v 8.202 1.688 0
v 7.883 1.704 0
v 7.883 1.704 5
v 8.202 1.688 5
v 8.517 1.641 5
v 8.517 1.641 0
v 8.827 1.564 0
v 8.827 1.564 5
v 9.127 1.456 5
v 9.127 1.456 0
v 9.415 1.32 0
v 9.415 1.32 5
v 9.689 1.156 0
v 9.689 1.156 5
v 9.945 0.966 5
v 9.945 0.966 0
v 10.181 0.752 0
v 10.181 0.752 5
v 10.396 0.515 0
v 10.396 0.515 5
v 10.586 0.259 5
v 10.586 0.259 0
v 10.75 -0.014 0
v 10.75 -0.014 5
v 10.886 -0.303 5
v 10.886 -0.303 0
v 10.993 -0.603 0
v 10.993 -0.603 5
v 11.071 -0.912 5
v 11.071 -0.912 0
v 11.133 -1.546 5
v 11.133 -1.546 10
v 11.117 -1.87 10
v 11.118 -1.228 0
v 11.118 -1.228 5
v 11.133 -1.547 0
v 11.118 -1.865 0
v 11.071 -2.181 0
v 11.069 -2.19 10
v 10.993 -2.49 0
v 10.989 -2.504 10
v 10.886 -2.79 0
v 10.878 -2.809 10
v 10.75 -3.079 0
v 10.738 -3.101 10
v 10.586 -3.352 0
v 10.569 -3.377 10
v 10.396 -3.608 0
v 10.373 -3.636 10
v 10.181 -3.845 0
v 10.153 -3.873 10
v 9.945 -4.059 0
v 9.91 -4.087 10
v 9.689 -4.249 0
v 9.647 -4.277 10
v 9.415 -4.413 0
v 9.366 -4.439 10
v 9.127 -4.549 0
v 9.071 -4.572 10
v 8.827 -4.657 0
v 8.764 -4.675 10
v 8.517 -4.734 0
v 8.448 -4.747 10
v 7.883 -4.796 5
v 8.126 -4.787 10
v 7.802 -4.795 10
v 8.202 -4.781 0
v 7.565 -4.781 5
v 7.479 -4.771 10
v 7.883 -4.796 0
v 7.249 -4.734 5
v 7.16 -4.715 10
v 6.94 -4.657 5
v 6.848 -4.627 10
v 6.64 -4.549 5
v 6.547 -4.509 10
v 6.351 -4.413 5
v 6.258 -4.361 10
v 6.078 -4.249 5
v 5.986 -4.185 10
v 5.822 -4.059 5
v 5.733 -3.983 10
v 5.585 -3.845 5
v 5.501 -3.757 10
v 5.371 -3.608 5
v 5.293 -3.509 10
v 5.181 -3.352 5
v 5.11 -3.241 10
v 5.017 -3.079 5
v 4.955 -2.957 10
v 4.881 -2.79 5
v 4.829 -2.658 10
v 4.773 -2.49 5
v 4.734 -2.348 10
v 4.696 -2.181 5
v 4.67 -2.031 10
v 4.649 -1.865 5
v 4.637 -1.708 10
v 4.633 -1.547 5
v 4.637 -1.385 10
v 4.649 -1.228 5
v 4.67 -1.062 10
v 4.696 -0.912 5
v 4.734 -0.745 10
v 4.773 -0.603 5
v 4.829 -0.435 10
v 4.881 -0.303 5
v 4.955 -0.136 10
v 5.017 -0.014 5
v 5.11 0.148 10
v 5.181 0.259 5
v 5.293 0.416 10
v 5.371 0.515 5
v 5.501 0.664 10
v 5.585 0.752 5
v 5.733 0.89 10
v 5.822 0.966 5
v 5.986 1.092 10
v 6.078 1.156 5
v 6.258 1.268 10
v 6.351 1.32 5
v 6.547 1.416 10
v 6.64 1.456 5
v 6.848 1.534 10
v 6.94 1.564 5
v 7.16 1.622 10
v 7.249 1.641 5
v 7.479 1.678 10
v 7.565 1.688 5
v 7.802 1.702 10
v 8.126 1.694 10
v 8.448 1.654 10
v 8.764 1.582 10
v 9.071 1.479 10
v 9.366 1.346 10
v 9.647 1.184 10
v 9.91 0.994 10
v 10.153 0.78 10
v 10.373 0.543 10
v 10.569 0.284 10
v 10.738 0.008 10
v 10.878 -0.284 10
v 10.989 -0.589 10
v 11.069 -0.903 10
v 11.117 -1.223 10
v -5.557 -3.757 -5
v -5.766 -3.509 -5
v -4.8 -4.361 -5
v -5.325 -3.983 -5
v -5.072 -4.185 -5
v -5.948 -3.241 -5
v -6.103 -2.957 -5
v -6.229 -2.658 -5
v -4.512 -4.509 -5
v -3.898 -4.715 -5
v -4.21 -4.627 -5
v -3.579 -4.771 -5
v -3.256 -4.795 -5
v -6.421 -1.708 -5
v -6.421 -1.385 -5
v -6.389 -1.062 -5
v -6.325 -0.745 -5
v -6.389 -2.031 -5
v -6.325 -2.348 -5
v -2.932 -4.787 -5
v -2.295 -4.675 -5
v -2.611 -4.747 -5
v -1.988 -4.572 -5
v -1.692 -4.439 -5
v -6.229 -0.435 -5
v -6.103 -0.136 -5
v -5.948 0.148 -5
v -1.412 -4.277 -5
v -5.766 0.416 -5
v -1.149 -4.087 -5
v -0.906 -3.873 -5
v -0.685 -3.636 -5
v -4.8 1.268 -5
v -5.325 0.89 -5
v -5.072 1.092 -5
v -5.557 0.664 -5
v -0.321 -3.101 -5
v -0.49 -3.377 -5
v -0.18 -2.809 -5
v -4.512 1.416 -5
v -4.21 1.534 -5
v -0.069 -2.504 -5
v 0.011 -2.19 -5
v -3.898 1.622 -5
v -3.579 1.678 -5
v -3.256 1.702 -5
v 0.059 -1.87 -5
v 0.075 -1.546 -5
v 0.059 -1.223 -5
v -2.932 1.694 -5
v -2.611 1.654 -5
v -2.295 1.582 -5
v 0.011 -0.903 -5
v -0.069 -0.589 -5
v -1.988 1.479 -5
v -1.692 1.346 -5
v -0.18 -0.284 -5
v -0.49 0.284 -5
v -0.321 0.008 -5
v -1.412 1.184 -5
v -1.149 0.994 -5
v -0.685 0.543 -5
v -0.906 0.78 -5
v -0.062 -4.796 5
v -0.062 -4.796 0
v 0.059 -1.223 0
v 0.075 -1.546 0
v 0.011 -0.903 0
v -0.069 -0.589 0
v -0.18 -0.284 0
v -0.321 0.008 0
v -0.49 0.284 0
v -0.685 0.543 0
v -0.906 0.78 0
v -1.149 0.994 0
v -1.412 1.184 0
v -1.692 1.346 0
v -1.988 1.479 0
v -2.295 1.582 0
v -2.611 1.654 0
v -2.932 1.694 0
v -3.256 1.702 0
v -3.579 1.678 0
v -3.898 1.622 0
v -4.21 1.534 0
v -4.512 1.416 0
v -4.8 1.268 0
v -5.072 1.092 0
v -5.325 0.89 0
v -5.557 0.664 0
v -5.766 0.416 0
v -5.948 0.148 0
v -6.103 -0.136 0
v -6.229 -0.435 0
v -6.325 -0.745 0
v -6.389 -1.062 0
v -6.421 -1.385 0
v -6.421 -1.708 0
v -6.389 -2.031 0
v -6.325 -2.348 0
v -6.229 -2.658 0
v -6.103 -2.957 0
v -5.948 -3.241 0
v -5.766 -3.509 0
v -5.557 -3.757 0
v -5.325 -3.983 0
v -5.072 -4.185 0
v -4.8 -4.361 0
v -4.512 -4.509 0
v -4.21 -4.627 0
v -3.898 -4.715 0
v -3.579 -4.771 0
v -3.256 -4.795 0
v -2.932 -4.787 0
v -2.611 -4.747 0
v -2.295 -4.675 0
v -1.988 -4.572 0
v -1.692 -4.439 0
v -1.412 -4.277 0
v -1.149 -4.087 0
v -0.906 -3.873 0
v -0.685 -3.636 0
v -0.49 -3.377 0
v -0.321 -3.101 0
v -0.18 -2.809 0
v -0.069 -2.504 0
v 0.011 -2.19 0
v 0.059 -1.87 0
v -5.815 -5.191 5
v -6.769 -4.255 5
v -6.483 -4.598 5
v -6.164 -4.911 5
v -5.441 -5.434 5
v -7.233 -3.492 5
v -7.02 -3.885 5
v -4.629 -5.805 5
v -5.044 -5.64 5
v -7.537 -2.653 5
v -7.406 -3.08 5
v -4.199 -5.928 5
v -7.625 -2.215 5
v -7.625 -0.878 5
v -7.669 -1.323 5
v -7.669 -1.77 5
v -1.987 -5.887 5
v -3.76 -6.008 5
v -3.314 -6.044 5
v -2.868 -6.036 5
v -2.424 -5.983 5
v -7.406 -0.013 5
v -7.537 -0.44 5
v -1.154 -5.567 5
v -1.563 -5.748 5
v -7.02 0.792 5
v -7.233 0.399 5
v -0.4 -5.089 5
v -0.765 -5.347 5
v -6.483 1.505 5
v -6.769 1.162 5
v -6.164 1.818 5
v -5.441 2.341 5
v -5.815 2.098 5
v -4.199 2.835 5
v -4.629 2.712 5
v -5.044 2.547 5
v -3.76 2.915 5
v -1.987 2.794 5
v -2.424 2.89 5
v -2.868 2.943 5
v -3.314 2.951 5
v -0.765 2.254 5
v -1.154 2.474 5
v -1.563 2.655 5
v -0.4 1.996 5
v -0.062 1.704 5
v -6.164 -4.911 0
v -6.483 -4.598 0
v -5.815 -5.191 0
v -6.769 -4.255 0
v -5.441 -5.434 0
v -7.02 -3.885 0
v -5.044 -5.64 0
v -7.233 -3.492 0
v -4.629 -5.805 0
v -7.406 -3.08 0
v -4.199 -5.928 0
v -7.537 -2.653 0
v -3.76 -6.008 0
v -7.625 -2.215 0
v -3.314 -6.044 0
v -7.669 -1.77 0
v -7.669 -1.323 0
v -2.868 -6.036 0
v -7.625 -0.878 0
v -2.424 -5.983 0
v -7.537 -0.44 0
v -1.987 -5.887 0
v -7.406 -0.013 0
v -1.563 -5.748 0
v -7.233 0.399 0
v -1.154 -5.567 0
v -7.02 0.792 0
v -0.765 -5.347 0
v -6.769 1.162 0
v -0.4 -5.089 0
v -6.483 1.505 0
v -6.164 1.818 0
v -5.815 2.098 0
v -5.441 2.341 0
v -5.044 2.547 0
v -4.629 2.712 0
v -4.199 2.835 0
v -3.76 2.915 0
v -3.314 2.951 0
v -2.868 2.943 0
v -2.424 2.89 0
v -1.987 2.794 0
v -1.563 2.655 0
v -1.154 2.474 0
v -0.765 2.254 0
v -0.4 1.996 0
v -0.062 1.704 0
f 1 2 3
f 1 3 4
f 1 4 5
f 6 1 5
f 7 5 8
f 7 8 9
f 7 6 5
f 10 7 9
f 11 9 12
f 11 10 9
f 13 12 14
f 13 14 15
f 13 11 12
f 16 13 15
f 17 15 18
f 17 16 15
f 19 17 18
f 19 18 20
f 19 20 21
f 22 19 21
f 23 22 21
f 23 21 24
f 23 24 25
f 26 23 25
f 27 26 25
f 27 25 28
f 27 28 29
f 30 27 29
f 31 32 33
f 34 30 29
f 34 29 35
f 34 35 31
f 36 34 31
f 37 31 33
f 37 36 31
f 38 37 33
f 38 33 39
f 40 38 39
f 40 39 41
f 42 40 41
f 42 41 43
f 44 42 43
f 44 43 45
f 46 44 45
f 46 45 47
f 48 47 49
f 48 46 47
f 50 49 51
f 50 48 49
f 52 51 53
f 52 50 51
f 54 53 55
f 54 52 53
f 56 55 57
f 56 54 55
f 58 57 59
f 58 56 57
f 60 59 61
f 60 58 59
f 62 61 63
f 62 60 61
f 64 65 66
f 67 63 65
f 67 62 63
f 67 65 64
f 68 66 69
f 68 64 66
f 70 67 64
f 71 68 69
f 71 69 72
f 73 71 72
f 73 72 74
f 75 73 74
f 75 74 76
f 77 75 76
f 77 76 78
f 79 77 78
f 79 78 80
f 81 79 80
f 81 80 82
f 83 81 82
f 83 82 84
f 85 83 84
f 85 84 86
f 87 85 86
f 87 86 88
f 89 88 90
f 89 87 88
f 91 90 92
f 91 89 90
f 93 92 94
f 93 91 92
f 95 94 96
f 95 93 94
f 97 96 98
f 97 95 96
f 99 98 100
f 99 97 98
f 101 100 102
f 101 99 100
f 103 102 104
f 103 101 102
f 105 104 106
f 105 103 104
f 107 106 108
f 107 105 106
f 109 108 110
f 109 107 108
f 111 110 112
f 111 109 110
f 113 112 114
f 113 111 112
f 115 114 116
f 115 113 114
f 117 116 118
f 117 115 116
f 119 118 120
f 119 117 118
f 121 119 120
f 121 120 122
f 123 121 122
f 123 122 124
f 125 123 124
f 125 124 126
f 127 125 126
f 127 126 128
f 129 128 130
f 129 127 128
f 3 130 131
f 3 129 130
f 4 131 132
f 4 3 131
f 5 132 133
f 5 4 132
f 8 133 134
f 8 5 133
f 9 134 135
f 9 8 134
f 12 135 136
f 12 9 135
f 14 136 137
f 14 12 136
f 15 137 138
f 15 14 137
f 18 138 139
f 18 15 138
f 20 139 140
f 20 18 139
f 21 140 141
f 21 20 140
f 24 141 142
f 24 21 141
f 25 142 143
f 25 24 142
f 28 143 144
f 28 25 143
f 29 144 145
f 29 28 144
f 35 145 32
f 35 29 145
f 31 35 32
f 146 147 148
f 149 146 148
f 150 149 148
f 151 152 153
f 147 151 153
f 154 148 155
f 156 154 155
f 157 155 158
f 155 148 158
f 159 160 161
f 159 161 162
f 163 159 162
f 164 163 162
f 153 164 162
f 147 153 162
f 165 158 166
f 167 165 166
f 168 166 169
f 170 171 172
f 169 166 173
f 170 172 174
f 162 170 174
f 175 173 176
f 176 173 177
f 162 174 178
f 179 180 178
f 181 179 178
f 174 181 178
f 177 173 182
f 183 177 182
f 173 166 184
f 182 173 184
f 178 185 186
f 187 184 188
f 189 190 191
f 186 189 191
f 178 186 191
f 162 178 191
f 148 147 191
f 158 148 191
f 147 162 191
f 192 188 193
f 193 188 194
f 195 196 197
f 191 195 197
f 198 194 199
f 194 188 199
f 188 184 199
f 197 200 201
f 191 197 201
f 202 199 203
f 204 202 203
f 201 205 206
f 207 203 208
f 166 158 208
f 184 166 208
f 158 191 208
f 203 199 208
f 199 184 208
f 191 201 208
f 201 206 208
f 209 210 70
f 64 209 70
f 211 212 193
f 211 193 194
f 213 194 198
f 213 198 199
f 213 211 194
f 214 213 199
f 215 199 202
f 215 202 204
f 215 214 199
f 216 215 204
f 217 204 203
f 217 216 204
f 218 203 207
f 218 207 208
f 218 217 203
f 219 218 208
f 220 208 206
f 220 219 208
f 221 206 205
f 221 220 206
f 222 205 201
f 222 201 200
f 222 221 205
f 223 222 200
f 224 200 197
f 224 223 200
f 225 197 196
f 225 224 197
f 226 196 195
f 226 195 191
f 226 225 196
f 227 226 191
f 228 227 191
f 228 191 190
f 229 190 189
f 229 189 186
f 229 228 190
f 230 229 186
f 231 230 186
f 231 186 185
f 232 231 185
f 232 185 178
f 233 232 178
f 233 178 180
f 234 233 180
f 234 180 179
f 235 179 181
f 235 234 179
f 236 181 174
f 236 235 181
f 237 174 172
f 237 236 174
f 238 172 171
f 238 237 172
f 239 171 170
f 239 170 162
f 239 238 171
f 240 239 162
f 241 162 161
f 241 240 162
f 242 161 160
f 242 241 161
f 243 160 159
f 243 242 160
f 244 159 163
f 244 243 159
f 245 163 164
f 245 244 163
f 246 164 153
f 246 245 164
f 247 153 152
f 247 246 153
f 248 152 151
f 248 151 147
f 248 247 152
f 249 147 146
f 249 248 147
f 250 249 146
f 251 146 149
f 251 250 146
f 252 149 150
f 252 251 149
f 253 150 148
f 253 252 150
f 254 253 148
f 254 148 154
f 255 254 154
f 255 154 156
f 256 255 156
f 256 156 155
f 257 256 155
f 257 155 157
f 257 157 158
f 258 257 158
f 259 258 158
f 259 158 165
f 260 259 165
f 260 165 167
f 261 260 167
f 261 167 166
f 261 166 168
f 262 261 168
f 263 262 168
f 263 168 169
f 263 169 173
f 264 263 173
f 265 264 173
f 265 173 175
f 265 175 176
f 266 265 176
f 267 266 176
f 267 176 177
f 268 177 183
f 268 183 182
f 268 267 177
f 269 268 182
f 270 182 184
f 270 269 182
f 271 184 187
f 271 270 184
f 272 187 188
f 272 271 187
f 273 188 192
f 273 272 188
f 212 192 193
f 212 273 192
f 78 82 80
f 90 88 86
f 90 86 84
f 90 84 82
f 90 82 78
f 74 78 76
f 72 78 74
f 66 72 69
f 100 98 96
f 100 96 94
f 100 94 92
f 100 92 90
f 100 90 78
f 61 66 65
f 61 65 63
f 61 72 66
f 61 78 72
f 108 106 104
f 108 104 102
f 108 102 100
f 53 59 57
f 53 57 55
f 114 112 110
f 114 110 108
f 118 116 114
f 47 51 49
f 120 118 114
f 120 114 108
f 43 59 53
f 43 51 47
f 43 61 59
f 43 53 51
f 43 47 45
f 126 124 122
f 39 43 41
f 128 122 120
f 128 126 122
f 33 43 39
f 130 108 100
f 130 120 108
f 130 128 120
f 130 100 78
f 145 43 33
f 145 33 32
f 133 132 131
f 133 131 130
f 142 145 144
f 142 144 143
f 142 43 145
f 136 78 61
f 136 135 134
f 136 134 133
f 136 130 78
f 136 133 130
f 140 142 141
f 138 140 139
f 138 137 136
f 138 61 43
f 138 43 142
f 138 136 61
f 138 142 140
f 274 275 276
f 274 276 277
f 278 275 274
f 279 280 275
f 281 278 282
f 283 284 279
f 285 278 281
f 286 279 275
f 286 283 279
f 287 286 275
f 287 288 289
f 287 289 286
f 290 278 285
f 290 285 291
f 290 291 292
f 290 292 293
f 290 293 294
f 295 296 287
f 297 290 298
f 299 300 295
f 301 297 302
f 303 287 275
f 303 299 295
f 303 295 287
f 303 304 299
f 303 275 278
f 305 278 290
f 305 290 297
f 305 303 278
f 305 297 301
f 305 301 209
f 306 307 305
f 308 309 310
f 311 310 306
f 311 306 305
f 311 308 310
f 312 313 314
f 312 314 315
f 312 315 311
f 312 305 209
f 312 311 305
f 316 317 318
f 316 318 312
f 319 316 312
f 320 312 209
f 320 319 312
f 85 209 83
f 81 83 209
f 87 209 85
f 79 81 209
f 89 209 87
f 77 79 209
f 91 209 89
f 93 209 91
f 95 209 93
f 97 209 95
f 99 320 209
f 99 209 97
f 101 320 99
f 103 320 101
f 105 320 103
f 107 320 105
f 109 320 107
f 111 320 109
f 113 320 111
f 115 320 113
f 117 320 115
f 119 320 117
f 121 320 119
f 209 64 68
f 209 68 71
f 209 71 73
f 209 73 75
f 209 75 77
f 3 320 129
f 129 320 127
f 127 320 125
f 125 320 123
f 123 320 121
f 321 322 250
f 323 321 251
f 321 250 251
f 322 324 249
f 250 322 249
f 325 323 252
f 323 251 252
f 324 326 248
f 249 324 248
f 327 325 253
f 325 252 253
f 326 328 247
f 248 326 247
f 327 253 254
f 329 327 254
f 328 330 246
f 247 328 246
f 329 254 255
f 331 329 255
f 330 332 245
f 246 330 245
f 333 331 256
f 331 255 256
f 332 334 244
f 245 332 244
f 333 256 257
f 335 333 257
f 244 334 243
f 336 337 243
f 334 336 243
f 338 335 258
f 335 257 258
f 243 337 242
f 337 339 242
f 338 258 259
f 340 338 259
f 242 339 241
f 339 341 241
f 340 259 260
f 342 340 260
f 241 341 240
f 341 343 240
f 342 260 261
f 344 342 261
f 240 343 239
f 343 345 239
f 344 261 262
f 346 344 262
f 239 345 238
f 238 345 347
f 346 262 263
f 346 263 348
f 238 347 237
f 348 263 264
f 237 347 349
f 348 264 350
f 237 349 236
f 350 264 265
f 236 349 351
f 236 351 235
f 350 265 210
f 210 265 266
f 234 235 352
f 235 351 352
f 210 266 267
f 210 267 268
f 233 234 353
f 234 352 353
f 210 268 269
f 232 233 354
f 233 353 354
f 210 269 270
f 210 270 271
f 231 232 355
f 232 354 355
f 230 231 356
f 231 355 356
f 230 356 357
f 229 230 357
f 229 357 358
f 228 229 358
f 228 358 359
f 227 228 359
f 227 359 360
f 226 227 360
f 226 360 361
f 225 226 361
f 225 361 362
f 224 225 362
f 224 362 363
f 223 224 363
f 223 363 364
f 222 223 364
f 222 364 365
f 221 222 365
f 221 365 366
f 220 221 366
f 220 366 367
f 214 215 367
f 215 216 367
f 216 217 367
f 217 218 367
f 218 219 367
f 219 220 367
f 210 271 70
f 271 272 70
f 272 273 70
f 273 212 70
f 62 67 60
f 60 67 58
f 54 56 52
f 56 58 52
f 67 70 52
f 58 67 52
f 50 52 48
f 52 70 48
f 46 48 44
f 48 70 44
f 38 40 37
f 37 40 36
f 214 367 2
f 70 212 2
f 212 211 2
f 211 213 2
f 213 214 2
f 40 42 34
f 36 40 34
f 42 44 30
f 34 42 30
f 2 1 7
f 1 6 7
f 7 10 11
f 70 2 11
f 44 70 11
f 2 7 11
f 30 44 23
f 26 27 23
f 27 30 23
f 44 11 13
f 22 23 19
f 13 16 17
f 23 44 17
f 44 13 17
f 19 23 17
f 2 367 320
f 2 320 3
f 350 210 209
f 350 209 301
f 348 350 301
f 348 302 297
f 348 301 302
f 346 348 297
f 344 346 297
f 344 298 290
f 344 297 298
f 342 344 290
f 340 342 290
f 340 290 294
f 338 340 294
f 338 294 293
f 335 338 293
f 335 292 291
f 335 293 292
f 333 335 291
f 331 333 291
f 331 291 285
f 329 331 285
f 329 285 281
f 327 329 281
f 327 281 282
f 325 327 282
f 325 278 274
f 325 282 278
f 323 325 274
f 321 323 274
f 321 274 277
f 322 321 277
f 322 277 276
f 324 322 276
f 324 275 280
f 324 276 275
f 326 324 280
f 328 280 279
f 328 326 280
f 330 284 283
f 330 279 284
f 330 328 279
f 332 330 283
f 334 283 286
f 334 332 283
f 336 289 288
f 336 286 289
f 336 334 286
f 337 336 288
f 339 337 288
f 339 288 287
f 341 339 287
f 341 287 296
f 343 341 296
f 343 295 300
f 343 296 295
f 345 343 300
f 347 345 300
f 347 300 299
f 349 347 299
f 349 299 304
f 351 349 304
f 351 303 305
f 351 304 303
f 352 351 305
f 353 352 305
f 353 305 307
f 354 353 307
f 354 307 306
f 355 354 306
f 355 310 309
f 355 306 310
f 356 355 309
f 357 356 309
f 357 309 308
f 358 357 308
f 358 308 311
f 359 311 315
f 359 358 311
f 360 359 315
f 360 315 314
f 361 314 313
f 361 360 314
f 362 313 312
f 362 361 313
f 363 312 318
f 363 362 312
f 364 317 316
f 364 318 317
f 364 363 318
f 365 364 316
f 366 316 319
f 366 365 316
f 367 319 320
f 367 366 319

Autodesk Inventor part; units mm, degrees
ref_plane "YZ Plane" through (0, 0, 0) normal (1, 0, 0) x (0, 1, 0)
ref_plane "XZ Plane" through (0, 0, 0) normal (0, 1, 0) x (-1, 0, 0)
ref_plane "XY Plane" through (0, 0, 0) normal (0, 0, 1) x (1, 0, 0)
sketch "Sketch2" plane through (0, 0, 0) normal (0, 0, 1) x (1, 0, 0)
  circle A0 centre (-3.175, -1.5465) radius 3.25
  line L0 (-0.0625, 1.7035) -> (7.8834, 1.7035)
  arc A1 (-0.0625, 1.7035) -> (-0.0625, -4.7965) centre (-3.175, -1.5465) ccw
  circle A2 centre (7.8834, -1.5465) radius 3.25
  line L1 (-11.3863, -1.5465) -> (20.6188, -1.5465) construction
  line L2 (-0.0625, -4.7965) -> (7.8834, -4.7965)
  point P0 (9.6395, 1.7844)
  dimension "d6" = 11.0584
  dimension "d7" = 6.5
  dimension "d8" = 6.5
  dimension "d9" = 9
extrude "Extrusion1" add sketch "Sketch2" along normal blind 5 contours A0 | L0 A2 L2 A1 | A2
extrude "Extrusion2" add sketch "Sketch2" against normal blind 5 contours A0
sketch "Sketch3" plane through (0, 0, 5) normal (0, 0, 1) x (1, 0, 0)
  circle A0 centre (7.8834, -1.5465) radius 3.25 projected
  point P0 (0, 0)
extrude "Extrusion3" add sketch "Sketch3" along normal blind 5
equation "\"d7\" = width"
equation "\"d8\" = width"
equation "\"d9\" = R1"
equation "\"d0\" = thickness"
equation "\"d2\" = thickness"
equation "\"d4\" = thickness"
equation "\"R\" = 6.5"
equation "\"thickness\" = 5"
equation "\"width\" = 6.5"
equation "\"R1\" = 9"
